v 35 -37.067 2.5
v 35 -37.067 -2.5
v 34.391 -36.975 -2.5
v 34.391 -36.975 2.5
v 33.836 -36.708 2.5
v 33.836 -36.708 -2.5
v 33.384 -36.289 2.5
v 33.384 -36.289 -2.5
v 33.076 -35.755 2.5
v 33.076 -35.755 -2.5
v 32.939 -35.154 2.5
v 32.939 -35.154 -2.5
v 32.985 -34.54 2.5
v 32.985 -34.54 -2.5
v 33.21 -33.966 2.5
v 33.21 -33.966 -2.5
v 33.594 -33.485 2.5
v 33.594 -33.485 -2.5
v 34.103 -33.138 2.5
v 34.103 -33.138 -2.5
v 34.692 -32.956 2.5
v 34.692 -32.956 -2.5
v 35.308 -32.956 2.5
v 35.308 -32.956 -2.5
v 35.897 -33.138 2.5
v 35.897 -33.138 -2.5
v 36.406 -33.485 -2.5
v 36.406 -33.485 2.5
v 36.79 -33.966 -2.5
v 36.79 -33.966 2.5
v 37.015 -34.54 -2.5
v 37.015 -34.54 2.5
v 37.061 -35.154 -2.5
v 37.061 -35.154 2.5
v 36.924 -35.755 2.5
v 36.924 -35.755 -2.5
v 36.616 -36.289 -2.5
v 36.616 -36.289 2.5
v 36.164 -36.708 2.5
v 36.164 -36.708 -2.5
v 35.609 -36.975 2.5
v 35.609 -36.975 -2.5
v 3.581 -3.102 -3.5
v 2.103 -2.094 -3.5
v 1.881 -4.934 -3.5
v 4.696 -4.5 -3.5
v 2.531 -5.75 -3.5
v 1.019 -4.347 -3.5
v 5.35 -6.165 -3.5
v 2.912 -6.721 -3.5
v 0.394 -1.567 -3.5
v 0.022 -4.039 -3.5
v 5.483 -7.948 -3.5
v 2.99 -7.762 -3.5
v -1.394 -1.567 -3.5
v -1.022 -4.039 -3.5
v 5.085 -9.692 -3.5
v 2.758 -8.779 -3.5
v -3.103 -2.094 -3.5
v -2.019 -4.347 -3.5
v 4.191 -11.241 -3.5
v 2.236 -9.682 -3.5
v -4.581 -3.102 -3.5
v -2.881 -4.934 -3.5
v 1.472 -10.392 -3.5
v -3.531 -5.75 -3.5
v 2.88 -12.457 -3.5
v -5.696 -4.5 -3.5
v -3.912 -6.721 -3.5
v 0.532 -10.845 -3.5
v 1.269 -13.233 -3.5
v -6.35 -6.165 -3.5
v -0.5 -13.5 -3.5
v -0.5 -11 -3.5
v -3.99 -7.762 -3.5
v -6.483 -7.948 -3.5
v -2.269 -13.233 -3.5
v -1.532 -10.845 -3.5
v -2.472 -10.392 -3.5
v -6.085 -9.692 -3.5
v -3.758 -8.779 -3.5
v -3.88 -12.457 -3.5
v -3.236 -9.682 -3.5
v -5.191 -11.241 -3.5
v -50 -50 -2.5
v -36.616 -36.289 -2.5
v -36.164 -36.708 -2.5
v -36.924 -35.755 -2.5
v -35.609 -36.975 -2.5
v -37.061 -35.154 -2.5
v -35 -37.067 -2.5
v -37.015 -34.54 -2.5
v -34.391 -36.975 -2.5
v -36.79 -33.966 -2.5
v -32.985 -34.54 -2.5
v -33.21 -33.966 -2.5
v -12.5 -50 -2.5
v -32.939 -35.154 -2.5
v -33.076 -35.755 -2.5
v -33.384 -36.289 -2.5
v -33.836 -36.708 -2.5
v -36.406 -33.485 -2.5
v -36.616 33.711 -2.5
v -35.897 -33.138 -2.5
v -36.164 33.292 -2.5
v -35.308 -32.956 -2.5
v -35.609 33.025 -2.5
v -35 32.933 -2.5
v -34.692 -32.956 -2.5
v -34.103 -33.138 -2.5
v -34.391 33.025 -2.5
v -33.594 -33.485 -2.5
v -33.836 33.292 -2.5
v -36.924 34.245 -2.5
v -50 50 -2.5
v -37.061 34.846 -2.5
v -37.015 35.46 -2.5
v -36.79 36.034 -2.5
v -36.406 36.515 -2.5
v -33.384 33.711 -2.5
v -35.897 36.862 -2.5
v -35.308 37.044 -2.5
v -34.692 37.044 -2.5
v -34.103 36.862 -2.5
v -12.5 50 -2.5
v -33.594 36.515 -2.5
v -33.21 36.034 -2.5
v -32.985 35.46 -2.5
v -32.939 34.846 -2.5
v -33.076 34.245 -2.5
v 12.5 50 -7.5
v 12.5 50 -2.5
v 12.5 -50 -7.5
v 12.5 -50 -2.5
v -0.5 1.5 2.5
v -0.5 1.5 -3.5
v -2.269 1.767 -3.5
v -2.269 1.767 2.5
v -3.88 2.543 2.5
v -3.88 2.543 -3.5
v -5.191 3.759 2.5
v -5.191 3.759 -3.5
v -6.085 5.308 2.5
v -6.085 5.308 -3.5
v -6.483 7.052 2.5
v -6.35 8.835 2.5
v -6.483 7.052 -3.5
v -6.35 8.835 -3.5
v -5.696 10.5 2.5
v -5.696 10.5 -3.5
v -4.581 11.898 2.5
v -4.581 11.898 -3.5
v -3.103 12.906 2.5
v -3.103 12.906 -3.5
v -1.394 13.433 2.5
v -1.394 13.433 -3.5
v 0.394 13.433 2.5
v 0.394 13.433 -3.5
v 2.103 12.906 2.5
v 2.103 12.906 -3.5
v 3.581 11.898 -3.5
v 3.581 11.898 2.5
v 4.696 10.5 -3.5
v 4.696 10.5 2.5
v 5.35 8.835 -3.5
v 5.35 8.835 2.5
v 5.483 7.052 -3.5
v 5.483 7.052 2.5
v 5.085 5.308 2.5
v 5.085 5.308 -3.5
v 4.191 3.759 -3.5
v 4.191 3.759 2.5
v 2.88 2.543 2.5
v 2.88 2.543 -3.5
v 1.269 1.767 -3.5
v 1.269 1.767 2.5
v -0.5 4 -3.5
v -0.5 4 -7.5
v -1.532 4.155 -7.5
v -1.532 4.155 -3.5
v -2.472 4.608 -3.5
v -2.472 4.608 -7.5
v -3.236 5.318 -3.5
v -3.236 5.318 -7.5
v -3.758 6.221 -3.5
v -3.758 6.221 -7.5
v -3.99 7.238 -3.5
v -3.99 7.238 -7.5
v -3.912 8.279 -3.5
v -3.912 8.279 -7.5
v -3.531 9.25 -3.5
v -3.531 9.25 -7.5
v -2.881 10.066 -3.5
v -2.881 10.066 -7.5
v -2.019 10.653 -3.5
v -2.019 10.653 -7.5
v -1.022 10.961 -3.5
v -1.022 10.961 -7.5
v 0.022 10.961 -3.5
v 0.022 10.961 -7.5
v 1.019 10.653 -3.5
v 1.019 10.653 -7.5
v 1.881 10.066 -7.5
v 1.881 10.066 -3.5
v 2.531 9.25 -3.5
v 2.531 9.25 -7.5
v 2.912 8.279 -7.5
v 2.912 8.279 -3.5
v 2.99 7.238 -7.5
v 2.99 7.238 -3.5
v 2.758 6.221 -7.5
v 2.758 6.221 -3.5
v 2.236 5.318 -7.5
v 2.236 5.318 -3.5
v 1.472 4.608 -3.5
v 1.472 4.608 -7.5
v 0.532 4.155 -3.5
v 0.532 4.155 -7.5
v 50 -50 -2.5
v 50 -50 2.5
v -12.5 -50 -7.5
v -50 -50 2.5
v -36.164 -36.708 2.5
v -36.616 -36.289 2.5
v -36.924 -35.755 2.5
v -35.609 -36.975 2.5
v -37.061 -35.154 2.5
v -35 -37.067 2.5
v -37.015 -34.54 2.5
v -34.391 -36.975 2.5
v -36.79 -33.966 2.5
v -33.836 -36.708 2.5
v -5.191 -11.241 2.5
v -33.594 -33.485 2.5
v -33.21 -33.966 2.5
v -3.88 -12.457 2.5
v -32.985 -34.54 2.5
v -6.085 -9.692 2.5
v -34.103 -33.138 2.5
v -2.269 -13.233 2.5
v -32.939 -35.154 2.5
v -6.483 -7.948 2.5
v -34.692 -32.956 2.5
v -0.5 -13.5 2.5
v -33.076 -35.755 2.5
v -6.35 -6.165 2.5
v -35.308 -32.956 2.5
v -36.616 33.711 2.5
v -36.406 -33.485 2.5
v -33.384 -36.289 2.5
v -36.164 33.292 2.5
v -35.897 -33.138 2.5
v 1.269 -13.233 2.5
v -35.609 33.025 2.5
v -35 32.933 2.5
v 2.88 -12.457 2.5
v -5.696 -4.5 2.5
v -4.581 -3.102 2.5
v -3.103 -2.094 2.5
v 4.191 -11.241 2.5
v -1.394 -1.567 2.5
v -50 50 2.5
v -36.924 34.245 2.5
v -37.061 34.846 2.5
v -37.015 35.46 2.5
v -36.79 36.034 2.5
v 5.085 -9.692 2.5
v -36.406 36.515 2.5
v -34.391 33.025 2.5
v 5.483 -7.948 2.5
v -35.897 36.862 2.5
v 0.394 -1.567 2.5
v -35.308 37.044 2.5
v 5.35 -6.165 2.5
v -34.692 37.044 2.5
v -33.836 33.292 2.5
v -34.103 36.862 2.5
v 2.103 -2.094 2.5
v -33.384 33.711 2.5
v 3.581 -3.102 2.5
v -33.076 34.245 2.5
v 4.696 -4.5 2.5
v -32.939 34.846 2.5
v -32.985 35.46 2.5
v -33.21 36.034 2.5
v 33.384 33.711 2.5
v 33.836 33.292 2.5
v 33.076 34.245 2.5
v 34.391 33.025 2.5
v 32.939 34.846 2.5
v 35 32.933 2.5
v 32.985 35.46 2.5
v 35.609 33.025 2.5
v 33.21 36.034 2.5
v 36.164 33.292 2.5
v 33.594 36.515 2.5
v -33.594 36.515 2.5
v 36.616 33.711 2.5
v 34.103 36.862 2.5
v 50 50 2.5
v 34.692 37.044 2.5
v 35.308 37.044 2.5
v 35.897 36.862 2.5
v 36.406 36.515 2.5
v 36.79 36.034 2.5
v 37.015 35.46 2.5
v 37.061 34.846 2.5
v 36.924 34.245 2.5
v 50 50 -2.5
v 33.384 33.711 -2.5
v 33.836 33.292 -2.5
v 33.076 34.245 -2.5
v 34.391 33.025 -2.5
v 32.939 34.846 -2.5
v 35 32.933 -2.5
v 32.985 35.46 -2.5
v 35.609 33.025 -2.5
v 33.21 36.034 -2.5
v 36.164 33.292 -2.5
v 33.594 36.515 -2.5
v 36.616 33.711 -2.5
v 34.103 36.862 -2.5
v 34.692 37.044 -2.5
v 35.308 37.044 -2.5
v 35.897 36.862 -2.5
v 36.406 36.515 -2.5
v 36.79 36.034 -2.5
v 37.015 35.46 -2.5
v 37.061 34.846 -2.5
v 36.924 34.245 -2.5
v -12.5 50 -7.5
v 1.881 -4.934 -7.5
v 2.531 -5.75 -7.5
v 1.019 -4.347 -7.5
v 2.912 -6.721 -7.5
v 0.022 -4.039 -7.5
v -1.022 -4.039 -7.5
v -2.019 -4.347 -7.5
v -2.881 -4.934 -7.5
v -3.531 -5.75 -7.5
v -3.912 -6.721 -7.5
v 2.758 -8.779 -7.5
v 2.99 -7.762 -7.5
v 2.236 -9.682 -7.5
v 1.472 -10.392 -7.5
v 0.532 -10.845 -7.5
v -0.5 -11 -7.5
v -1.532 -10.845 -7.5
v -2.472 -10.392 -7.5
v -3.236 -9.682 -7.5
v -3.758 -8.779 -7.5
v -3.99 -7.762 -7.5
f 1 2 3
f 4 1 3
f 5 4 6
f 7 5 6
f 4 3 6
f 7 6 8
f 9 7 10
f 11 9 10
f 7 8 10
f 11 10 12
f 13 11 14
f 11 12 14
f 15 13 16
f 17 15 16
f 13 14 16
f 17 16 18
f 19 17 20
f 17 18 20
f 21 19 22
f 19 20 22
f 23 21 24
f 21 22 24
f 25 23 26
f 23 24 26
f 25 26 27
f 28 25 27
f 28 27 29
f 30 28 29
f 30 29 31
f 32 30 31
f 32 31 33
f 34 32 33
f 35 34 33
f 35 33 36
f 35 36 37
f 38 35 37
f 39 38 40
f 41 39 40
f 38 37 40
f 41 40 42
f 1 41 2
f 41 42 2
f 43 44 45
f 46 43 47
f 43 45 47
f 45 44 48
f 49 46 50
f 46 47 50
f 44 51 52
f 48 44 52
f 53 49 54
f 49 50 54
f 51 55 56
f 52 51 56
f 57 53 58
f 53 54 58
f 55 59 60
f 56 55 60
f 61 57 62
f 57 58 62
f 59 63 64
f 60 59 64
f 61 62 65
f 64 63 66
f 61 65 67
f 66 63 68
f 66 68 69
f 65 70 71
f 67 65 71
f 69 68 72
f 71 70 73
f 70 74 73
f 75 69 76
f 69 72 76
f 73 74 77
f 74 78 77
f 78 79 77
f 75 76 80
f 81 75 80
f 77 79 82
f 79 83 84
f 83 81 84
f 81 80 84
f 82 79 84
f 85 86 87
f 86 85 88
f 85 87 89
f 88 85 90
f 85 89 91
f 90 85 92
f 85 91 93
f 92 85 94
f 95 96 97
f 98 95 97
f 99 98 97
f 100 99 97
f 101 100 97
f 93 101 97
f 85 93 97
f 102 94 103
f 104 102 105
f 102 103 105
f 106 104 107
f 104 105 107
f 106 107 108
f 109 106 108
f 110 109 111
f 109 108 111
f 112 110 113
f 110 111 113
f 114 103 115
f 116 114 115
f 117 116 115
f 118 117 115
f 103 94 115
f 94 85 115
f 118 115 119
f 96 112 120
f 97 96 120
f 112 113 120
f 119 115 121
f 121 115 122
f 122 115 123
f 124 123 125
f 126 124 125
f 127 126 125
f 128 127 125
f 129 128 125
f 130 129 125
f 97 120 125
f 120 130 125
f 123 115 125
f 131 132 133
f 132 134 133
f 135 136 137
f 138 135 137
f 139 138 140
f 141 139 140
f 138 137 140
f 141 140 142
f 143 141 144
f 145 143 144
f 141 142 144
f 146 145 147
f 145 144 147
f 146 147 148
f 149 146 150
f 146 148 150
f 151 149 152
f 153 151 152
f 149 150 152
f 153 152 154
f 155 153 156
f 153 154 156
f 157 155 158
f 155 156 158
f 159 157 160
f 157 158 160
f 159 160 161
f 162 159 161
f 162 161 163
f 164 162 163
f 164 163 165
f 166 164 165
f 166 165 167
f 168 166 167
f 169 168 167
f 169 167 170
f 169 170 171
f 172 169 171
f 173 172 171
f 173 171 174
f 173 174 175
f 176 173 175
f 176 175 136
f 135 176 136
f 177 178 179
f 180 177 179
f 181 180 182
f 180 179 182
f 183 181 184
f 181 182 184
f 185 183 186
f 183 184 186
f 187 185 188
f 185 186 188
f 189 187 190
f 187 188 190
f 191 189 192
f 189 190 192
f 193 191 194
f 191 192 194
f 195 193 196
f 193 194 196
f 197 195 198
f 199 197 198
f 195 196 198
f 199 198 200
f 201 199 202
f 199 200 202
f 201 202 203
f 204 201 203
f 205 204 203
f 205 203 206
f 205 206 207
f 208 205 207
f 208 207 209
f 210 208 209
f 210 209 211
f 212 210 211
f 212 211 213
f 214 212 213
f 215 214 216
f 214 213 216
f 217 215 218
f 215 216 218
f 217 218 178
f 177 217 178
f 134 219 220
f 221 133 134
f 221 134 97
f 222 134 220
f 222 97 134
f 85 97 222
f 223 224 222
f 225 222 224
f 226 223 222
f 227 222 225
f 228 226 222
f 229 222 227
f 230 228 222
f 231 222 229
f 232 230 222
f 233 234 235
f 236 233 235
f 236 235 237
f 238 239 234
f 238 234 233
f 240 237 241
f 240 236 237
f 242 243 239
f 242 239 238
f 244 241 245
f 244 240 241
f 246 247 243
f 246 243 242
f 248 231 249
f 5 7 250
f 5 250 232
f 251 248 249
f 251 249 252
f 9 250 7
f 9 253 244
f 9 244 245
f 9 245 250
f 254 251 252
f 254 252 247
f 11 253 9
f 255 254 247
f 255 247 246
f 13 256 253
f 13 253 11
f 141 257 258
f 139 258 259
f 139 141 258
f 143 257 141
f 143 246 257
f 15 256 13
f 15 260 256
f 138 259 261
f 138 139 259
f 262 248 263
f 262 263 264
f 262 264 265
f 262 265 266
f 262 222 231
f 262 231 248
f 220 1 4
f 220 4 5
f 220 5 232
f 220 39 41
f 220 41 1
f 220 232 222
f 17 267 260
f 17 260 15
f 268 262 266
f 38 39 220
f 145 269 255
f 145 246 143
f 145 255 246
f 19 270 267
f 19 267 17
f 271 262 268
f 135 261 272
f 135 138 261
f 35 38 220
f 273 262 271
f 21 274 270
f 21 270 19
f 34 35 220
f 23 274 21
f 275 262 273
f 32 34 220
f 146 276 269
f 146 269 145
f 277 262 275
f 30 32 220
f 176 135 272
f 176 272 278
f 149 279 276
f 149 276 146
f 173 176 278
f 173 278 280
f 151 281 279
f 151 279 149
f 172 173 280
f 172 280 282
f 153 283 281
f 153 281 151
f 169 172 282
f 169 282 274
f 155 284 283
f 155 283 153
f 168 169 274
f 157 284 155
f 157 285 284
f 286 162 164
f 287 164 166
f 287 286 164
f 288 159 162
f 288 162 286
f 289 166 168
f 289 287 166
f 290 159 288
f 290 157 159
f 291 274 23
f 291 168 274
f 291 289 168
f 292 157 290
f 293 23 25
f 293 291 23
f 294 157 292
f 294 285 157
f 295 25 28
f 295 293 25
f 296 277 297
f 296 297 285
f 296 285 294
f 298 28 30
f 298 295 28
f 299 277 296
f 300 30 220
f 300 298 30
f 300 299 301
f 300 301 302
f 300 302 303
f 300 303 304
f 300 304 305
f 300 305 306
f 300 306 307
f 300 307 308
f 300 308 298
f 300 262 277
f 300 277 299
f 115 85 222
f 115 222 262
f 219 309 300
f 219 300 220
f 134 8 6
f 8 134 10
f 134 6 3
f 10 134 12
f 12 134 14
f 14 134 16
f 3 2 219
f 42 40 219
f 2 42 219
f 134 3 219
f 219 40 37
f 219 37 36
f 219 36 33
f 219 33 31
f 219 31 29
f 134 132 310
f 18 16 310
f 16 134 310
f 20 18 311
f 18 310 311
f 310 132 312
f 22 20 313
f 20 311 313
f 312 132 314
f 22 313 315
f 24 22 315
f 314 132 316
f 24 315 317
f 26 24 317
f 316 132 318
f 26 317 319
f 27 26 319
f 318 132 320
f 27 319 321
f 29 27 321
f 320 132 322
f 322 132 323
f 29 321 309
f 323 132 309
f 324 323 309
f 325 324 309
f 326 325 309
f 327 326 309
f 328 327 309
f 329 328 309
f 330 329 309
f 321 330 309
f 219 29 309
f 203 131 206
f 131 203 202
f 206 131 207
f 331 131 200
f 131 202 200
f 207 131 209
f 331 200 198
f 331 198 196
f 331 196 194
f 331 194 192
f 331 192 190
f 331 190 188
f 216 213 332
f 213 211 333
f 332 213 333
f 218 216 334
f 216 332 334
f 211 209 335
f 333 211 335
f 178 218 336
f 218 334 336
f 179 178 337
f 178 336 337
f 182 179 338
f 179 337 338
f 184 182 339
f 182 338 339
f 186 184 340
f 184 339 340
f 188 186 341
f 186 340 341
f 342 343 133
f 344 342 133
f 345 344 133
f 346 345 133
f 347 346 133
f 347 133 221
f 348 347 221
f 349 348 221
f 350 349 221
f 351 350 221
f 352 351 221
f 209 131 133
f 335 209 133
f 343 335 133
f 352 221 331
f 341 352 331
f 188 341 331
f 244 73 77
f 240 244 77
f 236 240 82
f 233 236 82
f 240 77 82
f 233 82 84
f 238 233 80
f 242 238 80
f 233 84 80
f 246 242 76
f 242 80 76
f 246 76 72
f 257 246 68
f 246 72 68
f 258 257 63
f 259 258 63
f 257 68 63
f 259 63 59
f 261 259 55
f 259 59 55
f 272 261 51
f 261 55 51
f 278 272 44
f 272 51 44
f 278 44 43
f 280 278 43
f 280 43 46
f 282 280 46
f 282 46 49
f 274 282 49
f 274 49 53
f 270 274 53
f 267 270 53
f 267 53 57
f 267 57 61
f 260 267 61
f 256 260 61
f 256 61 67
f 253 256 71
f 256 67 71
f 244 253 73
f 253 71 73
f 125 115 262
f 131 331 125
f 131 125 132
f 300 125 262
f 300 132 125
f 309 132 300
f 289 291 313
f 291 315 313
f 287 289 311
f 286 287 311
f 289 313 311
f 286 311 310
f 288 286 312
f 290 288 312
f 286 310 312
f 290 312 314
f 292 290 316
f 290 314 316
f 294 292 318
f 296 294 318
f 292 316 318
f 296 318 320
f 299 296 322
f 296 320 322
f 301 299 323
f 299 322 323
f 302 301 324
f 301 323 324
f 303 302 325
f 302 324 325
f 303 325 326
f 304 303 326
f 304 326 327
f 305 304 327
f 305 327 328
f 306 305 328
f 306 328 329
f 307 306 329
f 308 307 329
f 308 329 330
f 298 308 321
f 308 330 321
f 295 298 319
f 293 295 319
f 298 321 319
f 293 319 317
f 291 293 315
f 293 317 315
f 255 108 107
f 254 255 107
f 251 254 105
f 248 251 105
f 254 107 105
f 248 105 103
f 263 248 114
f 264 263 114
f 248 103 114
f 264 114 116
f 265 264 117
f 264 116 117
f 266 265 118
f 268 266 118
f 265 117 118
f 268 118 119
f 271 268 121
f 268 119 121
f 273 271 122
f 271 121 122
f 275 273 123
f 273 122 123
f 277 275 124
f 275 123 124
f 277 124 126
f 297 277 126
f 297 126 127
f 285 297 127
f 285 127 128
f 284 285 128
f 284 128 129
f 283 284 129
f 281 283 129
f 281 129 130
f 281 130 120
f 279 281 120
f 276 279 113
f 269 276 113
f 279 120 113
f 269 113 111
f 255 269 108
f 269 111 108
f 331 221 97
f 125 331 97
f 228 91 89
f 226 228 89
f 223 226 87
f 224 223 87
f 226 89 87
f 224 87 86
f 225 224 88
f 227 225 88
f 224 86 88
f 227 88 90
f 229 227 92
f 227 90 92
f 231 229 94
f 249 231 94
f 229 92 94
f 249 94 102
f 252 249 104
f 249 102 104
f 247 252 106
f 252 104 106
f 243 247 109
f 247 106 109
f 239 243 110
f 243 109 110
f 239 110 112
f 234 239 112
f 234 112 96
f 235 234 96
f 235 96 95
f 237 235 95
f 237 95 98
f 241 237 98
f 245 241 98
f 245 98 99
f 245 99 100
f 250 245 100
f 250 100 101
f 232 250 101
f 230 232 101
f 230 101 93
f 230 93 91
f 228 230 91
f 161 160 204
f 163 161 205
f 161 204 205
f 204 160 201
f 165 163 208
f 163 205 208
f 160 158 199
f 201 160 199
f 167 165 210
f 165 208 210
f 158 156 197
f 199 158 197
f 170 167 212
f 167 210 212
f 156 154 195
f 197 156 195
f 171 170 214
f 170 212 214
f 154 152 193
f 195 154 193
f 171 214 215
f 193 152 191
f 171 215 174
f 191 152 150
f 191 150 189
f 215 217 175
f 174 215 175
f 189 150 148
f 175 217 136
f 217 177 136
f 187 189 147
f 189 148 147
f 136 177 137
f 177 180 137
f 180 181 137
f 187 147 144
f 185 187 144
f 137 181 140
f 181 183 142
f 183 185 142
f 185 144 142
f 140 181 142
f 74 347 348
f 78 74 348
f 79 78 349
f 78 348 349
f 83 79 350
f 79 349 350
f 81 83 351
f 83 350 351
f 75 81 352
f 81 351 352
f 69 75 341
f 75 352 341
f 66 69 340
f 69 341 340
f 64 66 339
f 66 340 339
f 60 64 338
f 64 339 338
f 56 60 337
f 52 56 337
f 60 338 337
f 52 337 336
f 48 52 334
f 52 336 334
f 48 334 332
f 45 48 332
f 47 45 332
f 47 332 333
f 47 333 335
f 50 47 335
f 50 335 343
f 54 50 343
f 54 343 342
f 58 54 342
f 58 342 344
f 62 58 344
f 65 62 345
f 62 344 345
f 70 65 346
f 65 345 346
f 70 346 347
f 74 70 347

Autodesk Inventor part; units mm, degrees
ref_plane "YZ Plane" through (0, 0, 0) normal (1, 0, 0) x (0, 1, 0)
ref_plane "XZ Plane" through (0, 0, 0) normal (0, 1, 0) x (-1, 0, 0)
ref_plane "XY Plane" through (0, 0, 0) normal (0, 0, 1) x (1, 0, 0)
sketch "Sketch4" plane through (0, 0, 0) normal (0, 0, 1) x (1, 0, 0)
  line L0 (-50, 50) -> (50, 50)
  line L1 (50, 50) -> (50, -50)
  line L2 (50, -50) -> (-50, -50)
  line L3 (-50, -50) -> (-50, 50)
  line L4 (-50, 50) -> (50, -50) construction
  line L5 (50, 50) -> (-50, -50) construction
  point P0 (0, 0)
  dimension "d34" = 100
  dimension "d35" = 100
extrude "Extrusion2" add sketch "Sketch4" along normal mid plane 5
sketch "Sketch5" plane through (-50, -50, 2.5) normal (0, -1, 0) x (1, 0, 0)
  line L0 (0, -5) -> (100, -5) projected
  line L1 (37.5, -5) -> (62.5, -5)
  line L2 (62.5, -5) -> (62.5, -10)
  line L3 (62.5, -10) -> (37.5, -10)
  line L4 (37.5, -10) -> (37.5, -5)
  line L5 (100, -5) -> (0, -5) projected
  point P0 (50, -2.5)
  point P1 (50, -5)
  point P2 (62.5, -7.5)
  point P3 (37.5, -7.5)
  point P4 (50, -5)
  dimension "d38" = 25
  dimension "d39" = 12.5
  dimension "d40" = 5
extrude "Extrusion3" add sketch "Sketch5" against normal up to surface (100 mm away)
sketch "Sketch6" plane through (0, 0, 2.5) normal (0, 0, 1) x (1, 0, 0)
  circle A0 centre (-0.5, 7.5) radius 2.4585 projected
  line L0 (-12.5, 13.5) -> (12.5, 13.5) projected
  circle A1 centre (-0.5, -7.5) radius 2.4585 projected
  point P0 (0, 0)
hole "Hole3" at (-0.5, -7.5, 2.5) at (-0.5, 7.5, 2.5) direction (0, 0, -1) diameter 7 depth 10 tip angle 118 counterbore diameter 12 counterbore depth 6
sketch "Sketch7" plane through (0, 0, 2.5) normal (0, 0, 1) x (1, 0, 0)
  line L0 (50, -50) -> (50, 50) projected
  line L1 (-50, -50) -> (50, -50) projected
  line L2 (50, 50) -> (-50, 50) projected
  line L3 (-50, 50) -> (-50, -50) projected
  point P0 (0, 0)
  point P1 (35, -35)
  point P2 (-35, -35)
  point P3 (-35, 35)
  point P4 (35, 35)
  dimension "d50" = 15
  dimension "d51" = 15
  dimension "d52" = 15
  dimension "d53" = 15
hole "Hole4" at (35, -35, 2.5) at (-35, -35, 2.5) at (-35, 35, 2.5) at (35, 35, 2.5) direction (0, 0, -1) diameter 4.134 depth 14.2 tip angle 118 thread size "M5x0.8" class "6H" standard "ISO Metric profile"
sketch "Sketch1" plane through (0, 0, 0) normal (0, 1, 0) x (-1, 0, 0)
  line L0 (65, -7.5) -> (-65, -7.5)
  line L1 (-65, -7.5) -> (-65, -7.5)
  line L2 (-65, -7.5) -> (-65, -7.5)
  line L3 (-65, -7.5) -> (-65, 2.5)
  line L4 (-65, 2.5) -> (-35, 2.5)
  line L5 (-35, 2.5) -> (-35, -2.5)
  line L6 (-35, -2.5) -> (65, -2.5)
  line L7 (65, -2.5) -> (65, -7.5)
  point P0 (0, 0)
  dimension "d0" = 130
  dimension "d1" = 130
  dimension "d2" = 30
  dimension "d5" = 5
  dimension "d6" = 5
  dimension "d7" = 10
  dimension "d8" = 65
  dimension "d9" = 7.5
sketch "Sketch3" plane through (65, 40, -7.5) normal (0, 0, -1) x (-1, 0, 0)
  line L0 (0, 0) -> (130, 0) projected
  line L1 (0, -80) -> (0, 0) projected
  point P0 (65, -40)
  point P1 (65, -40)
  point P2 (12, -32.5)
  point P3 (12, -47.5)
  dimension "d23" = 15
  dimension "d25" = 32.5
  dimension "d26" = 12
properties part number "HCMUTE-CDT23-BAN_CAN_LOADCELL" material "Stainless Steel"
